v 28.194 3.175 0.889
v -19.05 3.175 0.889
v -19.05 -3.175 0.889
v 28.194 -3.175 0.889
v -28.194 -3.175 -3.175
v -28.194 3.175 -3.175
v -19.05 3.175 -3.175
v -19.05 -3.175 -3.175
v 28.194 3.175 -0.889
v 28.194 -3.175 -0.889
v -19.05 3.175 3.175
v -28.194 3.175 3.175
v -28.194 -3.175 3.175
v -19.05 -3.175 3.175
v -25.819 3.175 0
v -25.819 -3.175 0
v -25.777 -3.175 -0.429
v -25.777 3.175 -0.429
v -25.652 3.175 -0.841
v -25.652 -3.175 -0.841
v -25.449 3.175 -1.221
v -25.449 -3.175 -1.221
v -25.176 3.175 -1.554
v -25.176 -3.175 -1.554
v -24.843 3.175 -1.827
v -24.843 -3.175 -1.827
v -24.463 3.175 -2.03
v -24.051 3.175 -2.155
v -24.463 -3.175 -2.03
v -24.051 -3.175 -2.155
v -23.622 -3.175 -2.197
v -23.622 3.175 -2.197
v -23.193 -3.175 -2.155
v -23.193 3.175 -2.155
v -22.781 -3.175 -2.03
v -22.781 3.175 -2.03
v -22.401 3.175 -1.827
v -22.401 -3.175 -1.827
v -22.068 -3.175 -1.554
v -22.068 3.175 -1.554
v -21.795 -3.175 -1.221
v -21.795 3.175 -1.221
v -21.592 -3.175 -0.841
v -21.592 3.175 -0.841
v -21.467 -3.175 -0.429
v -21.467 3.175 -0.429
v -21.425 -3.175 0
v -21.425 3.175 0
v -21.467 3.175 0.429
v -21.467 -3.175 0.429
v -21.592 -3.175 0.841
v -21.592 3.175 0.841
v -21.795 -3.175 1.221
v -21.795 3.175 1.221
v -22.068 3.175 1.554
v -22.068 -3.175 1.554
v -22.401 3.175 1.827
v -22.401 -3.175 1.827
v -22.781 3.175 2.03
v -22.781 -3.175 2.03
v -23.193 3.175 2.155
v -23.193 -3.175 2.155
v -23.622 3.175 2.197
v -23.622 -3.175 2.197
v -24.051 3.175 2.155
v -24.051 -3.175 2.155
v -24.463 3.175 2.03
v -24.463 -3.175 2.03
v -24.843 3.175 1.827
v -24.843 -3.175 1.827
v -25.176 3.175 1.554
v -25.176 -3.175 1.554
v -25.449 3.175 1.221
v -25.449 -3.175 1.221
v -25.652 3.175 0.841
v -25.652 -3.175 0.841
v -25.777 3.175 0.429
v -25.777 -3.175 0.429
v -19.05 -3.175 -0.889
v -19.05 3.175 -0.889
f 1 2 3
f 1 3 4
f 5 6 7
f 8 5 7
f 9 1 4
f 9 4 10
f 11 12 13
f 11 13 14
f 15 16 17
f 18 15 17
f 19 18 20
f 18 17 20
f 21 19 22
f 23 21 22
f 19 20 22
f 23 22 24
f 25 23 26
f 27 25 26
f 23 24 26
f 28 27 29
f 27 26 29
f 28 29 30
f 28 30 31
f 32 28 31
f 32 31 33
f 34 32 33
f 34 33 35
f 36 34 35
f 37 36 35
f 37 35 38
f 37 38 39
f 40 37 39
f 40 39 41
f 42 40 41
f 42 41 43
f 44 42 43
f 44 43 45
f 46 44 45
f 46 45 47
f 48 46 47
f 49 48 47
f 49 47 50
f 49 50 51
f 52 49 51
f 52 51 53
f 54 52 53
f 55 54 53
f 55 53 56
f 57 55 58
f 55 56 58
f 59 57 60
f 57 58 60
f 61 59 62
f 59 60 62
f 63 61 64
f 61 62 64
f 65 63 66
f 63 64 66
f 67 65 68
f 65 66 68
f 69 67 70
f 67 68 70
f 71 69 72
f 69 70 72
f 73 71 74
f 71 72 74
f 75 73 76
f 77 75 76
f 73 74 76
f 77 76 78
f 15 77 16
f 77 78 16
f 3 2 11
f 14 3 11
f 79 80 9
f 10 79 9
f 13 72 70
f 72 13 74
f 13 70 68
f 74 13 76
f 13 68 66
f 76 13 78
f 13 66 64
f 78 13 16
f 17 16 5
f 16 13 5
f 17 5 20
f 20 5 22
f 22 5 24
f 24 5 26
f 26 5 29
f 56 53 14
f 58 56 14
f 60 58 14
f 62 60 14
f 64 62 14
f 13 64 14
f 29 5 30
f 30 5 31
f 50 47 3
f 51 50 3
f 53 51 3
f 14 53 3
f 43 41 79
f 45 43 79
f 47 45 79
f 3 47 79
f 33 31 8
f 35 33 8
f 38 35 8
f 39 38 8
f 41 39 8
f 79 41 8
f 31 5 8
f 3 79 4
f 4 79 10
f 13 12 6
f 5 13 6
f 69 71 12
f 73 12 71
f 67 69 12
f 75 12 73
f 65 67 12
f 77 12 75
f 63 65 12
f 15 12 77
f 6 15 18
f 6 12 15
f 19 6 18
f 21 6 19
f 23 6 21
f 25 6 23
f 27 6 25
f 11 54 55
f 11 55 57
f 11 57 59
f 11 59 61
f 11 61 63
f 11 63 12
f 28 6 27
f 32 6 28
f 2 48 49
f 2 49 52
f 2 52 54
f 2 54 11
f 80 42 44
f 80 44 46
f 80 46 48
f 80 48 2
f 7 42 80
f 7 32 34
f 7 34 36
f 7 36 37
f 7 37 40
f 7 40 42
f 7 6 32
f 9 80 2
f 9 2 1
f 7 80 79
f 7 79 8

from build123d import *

# Parameters (mm, degrees)
SKETCH1_W                   = 56.388
SKETCH1_H                   = 6.35
BOSS_EXTRUDE1_DEPTH         = 3.175
F_17_0_173_DIAMETER_HOLE1_D = 4.3942
SKETCH4_W                   = 47.244
SKETCH4_H                   = 2.286
CUT_EXTRUDE1_DEPTH          = 30.074125283


with BuildPart() as part:
    # Sketch1 → Boss-Extrude1 (new, symmetric)
    with BuildSketch(Plane(origin=(0, 0, 0), x_dir=(1, 0, 0), z_dir=(0, 1, 0))):
        Rectangle(SKETCH1_W, SKETCH1_H)
    extrude(amount=BOSS_EXTRUDE1_DEPTH, both=True)

    # #17 (0.173) Diameter Hole1 (through all)
    with Locations(Plane(origin=(0, 3.175, 0), x_dir=(1, 0, 0), z_dir=(0, 1, 0))):
        with Locations((-23.622, 0)):
            Hole(F_17_0_173_DIAMETER_HOLE1_D / 2)

    # Sketch4 → Cut-Extrude1 (cut, through all)
    with BuildSketch(Plane(origin=(0, 3.175, 0), x_dir=(1, 0, 0), z_dir=(0, 1, 0))):
        with Locations((4.572, 2.032)):
            Rectangle(SKETCH4_W, SKETCH4_H)
    cut_extrude1 = extrude(amount=-CUT_EXTRUDE1_DEPTH, mode=Mode.SUBTRACT)

    # Mirror1: Cut-Extrude1 across plane
    add(cut_extrude1.mirror(Plane.XY), mode=Mode.SUBTRACT)


solid = part.part
